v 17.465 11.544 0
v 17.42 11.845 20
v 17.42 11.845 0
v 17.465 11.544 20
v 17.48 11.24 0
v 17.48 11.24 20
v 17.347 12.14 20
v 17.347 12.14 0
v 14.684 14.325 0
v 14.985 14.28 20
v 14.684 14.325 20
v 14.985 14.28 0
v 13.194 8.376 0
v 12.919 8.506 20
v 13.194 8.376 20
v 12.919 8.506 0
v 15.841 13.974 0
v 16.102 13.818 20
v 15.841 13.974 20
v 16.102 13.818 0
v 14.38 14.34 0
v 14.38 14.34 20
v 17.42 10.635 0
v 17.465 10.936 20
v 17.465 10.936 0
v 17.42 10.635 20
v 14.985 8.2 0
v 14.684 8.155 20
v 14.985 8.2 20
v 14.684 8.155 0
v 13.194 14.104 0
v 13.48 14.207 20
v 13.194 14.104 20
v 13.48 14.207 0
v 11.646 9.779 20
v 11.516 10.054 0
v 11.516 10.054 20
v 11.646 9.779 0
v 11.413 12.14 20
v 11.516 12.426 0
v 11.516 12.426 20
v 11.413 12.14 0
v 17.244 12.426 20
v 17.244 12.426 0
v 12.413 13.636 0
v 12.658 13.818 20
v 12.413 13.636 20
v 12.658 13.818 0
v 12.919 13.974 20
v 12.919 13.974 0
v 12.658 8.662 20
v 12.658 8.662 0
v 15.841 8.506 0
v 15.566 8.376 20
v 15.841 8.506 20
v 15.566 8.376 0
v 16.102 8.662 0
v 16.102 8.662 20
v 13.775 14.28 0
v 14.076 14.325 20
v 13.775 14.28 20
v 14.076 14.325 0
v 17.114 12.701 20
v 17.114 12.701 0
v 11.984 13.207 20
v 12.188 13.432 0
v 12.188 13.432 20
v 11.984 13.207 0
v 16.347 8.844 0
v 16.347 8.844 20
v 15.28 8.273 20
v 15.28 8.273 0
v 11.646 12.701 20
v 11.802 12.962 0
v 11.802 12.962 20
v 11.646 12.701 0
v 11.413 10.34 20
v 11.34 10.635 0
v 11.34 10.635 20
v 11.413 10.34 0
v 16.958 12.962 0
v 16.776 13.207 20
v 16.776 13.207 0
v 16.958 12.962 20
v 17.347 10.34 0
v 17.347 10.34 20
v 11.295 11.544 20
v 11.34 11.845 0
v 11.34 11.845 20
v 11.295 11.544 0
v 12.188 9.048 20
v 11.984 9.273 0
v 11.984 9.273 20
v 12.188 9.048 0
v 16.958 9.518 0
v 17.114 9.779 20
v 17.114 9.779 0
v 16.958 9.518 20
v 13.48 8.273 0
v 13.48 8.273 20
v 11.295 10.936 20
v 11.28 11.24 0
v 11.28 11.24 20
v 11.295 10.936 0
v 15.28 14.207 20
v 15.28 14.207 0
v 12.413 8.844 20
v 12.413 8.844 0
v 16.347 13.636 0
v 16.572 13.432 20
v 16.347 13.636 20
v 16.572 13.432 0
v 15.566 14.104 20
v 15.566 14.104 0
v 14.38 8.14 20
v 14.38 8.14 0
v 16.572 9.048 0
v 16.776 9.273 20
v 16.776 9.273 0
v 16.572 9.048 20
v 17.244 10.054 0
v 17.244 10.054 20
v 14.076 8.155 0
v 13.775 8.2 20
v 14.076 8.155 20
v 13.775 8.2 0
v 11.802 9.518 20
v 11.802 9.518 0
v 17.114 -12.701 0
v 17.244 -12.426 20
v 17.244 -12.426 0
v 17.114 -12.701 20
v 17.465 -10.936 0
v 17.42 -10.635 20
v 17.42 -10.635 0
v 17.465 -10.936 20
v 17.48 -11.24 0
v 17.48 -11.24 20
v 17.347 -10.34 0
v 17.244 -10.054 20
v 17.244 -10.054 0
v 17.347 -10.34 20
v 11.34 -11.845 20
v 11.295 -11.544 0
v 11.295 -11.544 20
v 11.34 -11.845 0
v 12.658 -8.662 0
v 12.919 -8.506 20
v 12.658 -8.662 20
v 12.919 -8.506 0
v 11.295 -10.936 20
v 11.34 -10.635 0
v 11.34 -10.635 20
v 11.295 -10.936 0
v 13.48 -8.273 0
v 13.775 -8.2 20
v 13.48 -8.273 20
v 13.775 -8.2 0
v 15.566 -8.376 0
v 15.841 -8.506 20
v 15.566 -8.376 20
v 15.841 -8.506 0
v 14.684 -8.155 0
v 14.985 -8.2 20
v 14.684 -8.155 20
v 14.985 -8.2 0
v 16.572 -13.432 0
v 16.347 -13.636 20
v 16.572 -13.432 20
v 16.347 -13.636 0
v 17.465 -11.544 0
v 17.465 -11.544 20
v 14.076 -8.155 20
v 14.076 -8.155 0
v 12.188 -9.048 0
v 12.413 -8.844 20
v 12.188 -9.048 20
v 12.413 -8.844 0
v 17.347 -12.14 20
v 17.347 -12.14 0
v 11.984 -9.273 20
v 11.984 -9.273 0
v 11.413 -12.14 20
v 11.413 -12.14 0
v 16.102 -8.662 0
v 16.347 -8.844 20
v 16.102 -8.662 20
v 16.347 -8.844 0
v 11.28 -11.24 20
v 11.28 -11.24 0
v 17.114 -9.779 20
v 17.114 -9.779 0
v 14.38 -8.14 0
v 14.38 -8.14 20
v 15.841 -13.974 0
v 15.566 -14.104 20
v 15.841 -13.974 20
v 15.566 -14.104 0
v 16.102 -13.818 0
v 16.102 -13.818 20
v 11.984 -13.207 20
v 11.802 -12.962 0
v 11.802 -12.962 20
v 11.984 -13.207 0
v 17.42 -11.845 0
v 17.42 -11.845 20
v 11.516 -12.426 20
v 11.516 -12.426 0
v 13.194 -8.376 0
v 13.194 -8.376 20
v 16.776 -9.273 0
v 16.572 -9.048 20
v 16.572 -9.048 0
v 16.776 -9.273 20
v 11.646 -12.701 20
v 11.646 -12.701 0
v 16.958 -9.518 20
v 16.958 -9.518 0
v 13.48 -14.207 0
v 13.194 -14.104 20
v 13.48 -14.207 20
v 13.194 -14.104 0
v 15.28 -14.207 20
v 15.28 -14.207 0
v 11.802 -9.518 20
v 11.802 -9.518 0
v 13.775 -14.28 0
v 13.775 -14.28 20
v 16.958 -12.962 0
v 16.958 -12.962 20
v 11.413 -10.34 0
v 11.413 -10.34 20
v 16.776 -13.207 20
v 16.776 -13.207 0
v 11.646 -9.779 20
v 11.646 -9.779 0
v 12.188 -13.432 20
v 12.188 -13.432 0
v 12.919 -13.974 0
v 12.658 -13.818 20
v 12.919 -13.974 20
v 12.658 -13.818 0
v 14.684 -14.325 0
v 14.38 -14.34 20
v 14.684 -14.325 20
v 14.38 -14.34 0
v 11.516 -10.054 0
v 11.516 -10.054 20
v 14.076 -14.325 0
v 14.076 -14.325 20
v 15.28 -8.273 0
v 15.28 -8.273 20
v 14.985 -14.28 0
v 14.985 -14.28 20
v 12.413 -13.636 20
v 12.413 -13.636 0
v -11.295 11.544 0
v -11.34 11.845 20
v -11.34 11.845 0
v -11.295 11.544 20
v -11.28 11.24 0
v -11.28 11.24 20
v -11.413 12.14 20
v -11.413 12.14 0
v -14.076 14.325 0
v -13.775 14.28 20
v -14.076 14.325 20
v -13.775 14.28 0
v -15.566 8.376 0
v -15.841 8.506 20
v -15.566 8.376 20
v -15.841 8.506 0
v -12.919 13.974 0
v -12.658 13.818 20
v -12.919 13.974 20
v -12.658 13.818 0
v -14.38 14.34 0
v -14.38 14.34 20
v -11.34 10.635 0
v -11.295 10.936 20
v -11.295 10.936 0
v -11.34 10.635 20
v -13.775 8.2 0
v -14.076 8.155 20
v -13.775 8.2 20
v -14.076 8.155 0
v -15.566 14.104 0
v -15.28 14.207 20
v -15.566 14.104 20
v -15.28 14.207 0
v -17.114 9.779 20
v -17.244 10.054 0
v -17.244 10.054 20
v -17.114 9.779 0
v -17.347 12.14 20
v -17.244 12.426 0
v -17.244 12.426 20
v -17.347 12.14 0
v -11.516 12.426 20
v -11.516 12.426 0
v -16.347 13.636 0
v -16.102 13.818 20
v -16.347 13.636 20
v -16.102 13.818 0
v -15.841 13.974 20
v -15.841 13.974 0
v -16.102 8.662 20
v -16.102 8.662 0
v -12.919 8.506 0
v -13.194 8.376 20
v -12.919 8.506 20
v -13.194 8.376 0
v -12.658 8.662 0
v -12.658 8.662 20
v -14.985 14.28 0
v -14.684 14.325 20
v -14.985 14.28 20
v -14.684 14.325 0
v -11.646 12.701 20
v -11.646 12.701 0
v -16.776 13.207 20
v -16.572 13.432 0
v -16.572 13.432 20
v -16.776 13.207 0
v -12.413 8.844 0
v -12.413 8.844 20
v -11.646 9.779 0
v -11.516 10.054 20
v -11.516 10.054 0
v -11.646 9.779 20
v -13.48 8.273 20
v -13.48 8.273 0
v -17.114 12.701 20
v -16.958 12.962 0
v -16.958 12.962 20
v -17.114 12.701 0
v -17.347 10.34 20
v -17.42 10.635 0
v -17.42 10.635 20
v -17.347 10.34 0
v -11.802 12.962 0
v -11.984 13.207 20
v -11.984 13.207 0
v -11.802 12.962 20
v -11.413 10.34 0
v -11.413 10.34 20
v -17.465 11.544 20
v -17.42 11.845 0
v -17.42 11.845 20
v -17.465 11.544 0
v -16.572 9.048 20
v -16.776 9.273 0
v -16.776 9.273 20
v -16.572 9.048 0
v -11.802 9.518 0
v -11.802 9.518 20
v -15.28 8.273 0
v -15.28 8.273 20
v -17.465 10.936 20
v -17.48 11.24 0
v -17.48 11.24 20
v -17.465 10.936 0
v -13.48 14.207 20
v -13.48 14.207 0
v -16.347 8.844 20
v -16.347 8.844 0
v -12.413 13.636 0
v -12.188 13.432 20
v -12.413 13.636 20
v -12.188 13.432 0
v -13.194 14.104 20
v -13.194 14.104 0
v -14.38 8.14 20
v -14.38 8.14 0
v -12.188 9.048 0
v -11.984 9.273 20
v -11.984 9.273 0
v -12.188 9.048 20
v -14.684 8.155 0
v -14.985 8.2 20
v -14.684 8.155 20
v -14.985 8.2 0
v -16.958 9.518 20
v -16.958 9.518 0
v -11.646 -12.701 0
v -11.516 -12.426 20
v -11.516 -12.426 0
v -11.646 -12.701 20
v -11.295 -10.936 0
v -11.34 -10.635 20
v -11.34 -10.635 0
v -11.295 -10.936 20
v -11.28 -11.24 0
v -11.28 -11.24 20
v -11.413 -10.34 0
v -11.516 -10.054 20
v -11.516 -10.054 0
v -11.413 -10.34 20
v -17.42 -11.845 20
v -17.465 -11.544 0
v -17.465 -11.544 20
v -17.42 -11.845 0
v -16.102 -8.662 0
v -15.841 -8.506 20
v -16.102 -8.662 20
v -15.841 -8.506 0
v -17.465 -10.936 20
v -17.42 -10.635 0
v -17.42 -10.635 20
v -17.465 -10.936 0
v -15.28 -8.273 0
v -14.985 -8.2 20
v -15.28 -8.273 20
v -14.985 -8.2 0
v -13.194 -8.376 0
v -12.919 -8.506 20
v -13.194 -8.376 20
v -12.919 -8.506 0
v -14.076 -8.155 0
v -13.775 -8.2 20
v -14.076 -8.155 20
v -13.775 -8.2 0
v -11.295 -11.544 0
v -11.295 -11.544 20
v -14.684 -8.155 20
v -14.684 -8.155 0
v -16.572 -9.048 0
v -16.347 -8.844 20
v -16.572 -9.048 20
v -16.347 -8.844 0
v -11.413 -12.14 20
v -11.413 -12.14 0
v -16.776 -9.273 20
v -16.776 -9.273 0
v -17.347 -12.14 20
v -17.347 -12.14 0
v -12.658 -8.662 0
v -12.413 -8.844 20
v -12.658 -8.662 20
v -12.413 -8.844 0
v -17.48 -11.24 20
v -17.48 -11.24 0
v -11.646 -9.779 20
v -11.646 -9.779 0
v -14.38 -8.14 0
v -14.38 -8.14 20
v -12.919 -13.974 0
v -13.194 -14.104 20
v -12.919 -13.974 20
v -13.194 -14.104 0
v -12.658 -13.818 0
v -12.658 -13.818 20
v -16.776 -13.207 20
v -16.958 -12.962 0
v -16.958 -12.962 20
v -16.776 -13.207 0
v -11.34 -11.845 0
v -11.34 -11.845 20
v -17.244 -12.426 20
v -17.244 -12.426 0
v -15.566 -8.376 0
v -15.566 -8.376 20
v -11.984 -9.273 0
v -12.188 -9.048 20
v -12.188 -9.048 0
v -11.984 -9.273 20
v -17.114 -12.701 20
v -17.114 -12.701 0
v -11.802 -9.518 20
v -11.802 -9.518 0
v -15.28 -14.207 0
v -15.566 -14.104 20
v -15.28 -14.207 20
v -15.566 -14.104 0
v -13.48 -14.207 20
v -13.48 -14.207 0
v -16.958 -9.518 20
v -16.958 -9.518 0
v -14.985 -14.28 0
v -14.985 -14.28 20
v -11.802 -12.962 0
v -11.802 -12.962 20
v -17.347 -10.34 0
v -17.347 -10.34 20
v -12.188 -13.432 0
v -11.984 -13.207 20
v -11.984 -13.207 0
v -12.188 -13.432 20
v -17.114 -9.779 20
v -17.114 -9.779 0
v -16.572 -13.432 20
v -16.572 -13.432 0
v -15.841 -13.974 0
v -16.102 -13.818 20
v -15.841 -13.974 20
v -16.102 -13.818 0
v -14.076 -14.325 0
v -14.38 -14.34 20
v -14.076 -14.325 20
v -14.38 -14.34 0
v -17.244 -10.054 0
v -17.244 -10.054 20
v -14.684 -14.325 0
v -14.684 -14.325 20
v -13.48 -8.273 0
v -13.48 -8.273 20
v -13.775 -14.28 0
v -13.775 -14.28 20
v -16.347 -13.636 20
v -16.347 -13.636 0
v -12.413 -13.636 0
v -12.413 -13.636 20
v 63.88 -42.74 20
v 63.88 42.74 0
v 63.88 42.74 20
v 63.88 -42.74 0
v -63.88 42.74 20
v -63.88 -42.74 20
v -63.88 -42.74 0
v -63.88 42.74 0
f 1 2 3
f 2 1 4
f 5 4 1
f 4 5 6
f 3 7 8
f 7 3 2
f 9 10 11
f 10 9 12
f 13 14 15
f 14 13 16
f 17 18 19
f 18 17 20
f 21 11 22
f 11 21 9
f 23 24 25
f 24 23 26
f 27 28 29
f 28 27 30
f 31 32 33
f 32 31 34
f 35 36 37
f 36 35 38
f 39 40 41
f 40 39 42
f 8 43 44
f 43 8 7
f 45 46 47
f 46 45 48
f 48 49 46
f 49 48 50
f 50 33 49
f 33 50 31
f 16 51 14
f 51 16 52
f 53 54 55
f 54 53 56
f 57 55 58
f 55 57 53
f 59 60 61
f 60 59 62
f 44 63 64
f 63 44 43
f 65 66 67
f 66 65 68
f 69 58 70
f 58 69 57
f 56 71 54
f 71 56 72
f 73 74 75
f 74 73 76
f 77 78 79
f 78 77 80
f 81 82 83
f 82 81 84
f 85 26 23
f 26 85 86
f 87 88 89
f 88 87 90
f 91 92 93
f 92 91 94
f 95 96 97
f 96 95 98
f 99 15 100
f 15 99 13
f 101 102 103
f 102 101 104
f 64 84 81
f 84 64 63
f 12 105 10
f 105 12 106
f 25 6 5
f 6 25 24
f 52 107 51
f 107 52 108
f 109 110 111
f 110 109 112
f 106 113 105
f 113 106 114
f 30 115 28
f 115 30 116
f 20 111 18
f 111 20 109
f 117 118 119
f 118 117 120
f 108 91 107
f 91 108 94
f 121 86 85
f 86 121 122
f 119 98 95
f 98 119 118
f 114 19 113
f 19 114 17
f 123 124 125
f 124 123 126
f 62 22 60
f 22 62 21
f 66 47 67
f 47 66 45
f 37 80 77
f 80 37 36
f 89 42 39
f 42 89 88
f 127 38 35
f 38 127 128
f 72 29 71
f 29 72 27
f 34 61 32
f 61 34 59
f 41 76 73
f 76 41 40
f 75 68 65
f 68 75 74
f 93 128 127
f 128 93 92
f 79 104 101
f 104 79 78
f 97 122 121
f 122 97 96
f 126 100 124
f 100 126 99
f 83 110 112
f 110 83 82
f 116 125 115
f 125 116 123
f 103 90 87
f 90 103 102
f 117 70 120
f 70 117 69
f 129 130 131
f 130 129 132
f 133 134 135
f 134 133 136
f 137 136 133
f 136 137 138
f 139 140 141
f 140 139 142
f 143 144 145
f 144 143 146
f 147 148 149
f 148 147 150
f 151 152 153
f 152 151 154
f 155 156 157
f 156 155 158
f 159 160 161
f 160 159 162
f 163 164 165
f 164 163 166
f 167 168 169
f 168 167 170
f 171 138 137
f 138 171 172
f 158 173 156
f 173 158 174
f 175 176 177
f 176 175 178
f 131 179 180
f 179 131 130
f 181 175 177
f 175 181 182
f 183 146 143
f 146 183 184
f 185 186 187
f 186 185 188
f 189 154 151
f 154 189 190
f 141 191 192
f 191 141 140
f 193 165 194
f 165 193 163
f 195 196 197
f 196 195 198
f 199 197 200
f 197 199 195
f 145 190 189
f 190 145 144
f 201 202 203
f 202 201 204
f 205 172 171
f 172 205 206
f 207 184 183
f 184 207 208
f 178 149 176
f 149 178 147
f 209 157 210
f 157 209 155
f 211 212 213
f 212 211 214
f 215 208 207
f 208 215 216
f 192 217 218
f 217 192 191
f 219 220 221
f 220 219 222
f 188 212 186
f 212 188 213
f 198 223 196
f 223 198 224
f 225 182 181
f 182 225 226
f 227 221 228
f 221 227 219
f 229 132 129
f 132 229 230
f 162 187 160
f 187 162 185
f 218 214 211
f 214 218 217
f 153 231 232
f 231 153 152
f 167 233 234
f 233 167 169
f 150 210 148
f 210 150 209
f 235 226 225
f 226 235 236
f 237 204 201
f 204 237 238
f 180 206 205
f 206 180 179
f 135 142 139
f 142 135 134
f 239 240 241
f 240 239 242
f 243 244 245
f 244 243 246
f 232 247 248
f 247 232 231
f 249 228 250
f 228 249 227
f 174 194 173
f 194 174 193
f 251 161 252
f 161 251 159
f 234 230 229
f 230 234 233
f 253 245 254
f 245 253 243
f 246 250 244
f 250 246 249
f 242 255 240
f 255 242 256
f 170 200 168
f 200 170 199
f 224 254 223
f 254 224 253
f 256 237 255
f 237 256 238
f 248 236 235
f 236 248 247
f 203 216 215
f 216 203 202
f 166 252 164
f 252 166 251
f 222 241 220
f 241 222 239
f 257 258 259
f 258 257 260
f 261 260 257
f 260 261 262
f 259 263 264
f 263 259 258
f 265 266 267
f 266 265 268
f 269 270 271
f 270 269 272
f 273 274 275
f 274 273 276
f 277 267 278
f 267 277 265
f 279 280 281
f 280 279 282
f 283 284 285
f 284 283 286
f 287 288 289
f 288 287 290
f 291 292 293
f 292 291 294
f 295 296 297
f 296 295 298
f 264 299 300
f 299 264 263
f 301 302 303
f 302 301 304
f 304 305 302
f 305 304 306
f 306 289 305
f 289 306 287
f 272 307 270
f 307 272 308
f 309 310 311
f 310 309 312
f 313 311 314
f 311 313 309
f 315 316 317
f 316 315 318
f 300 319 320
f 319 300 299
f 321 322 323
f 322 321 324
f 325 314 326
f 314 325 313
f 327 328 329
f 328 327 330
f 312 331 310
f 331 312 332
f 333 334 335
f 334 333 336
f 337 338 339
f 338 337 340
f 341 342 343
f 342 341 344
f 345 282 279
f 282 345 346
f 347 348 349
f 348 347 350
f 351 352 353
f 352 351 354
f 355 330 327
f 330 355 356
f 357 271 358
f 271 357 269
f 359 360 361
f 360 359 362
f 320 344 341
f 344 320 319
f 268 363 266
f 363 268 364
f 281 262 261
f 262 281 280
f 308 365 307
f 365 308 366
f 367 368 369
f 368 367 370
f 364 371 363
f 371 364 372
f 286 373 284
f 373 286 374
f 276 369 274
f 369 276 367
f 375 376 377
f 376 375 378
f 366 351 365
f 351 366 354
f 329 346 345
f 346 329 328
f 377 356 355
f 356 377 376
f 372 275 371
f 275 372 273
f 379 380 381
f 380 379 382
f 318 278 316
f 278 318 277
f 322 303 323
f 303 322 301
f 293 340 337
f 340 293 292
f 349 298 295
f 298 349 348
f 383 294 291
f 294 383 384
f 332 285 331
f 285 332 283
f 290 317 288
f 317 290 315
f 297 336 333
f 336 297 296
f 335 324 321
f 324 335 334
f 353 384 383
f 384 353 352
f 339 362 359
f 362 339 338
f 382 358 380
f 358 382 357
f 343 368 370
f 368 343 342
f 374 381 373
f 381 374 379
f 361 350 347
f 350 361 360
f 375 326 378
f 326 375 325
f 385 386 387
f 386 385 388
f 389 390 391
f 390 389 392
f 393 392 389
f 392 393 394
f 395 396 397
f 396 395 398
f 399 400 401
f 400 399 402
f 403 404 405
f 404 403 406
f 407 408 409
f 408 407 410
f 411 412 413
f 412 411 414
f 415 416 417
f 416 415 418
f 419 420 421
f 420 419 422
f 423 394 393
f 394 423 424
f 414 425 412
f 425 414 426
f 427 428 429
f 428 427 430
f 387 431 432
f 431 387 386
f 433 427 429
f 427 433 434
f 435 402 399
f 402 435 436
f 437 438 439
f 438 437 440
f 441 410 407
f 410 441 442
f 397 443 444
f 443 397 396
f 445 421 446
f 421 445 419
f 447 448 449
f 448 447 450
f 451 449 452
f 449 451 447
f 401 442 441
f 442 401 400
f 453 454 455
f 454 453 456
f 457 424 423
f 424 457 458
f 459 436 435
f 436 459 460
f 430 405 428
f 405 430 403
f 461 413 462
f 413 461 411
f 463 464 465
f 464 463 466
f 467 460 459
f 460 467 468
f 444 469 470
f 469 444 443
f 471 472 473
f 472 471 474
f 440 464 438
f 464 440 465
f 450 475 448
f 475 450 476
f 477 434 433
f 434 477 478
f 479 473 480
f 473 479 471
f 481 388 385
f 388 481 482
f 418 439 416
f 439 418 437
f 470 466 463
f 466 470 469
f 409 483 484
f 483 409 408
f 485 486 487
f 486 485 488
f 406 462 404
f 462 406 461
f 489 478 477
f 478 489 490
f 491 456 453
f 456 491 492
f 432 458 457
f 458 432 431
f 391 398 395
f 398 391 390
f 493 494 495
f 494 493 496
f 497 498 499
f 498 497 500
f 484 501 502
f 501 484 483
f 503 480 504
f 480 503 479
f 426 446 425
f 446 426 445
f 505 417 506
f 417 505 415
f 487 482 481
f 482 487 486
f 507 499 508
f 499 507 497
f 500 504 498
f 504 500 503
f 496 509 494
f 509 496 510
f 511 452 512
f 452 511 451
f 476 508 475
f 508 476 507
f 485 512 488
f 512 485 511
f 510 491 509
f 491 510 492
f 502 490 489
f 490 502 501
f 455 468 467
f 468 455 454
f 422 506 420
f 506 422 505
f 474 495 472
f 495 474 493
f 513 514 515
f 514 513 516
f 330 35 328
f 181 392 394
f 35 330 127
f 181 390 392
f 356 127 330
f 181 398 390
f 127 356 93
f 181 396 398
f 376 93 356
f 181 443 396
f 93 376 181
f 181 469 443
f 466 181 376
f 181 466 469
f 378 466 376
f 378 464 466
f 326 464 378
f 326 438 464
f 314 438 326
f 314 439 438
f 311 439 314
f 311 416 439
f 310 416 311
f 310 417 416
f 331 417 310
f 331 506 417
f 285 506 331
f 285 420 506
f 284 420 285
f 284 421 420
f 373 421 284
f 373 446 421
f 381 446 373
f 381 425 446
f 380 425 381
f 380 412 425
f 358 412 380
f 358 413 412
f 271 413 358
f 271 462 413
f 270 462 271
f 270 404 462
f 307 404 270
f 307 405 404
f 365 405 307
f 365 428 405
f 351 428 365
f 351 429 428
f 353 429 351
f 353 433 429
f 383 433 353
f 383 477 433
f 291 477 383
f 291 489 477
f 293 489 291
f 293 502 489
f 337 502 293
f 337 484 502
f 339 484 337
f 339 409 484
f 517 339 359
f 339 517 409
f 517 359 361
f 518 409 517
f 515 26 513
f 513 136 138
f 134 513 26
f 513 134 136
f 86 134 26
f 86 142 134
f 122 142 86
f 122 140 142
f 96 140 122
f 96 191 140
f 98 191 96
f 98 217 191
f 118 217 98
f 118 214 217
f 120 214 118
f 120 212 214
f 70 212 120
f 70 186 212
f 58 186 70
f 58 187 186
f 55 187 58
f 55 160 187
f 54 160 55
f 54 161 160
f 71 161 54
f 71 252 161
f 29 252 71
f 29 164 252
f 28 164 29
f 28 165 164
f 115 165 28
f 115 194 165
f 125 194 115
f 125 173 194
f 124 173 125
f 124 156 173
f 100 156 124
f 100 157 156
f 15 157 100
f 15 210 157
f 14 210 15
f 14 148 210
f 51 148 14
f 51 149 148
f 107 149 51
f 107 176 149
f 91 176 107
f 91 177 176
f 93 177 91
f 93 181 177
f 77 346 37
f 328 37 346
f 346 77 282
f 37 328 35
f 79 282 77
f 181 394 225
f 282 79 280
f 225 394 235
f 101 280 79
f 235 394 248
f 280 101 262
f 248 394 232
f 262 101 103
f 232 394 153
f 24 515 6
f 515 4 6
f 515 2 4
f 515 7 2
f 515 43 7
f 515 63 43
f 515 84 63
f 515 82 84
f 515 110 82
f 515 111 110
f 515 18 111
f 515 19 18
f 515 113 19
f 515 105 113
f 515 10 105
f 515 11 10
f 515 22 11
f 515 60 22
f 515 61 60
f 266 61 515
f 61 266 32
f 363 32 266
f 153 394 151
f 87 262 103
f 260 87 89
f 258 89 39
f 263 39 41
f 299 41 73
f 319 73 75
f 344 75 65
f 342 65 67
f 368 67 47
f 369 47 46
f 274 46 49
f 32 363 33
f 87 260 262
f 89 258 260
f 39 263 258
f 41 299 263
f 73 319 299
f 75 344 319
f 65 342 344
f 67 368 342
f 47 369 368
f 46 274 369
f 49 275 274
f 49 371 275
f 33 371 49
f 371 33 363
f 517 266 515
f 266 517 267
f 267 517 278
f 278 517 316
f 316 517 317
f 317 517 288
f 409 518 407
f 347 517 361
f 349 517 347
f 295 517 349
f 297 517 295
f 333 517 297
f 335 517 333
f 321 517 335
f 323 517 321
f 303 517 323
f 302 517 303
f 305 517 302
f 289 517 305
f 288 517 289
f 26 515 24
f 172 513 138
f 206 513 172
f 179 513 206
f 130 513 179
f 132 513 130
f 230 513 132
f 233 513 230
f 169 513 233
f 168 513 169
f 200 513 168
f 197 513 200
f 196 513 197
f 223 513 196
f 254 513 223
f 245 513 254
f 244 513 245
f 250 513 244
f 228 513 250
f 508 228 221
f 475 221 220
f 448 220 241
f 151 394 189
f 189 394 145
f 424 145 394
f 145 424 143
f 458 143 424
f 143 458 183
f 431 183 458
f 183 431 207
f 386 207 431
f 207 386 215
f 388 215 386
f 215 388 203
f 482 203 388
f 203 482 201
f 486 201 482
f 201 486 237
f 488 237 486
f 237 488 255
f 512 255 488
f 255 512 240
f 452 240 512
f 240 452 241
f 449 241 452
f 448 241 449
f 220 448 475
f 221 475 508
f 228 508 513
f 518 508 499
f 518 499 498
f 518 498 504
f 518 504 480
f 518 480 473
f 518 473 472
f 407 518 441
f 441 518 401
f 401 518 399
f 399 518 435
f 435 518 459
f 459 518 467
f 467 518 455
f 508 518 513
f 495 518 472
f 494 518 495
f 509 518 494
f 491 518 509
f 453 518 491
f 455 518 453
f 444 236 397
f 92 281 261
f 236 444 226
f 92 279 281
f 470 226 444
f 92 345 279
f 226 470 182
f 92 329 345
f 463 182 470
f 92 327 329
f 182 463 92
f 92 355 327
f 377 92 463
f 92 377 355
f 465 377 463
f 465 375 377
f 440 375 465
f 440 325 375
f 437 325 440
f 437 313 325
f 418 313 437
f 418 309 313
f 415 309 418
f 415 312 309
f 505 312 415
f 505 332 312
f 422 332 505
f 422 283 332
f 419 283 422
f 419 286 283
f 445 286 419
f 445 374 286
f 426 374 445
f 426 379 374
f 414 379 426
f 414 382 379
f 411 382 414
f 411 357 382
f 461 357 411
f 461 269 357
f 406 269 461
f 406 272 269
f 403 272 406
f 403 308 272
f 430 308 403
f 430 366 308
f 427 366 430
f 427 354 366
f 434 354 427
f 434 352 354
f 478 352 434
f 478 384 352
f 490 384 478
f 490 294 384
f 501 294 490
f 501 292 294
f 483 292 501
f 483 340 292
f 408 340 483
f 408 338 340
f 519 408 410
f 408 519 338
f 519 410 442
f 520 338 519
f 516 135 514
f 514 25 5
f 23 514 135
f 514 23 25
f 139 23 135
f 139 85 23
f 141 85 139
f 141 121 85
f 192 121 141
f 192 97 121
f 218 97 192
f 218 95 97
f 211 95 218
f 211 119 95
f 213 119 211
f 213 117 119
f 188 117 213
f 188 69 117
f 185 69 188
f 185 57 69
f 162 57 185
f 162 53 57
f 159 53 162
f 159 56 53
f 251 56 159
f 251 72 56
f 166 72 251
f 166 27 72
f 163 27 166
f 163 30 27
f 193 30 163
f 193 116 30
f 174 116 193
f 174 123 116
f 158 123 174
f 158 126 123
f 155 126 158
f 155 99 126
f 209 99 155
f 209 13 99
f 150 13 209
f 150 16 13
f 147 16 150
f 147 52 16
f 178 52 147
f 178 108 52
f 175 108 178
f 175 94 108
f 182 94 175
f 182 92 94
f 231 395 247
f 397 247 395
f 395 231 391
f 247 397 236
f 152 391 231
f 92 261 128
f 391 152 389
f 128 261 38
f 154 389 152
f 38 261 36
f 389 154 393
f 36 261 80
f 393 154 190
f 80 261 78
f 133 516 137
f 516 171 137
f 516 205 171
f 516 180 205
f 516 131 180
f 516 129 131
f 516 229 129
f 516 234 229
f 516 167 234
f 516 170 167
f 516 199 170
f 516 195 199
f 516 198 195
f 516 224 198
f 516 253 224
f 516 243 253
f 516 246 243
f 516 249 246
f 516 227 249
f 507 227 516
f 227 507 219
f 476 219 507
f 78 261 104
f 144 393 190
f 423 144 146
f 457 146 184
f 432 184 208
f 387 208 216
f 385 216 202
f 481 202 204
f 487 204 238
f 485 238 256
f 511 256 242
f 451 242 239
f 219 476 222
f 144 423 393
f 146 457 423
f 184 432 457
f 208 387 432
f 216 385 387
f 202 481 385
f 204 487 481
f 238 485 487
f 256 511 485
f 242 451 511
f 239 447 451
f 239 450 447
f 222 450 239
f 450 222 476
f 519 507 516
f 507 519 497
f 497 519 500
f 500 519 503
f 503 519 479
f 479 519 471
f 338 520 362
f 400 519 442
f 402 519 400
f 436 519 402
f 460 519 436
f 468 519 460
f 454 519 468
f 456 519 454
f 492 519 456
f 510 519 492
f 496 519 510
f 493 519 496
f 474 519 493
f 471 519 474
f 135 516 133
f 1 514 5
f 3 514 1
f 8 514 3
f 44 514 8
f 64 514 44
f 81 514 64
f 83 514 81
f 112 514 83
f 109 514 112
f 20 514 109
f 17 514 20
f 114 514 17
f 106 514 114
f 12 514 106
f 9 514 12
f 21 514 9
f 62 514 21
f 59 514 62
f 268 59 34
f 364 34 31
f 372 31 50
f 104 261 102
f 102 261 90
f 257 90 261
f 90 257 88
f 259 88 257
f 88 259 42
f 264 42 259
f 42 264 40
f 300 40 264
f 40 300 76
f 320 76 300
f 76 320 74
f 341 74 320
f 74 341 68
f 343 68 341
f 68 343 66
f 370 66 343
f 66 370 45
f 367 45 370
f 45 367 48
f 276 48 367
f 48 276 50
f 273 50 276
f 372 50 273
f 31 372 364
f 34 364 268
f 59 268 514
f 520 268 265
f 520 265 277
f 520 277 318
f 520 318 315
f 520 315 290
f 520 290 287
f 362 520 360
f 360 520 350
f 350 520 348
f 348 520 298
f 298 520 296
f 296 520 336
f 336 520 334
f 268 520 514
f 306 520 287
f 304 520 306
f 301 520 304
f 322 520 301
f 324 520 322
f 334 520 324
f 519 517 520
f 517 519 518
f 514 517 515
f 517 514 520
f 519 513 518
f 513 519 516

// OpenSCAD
// Built by bench/smallmodels/features/compiler.py from a list of features.
$fn = 64;
difference() {
  union() {
    translate([0, 0, 0]) translate([-63.88, -42.74, 0]) cube([127.76, 85.48, 20]);
  }
  union() {
    translate([14.38, 11.24, -0.01]) rotate([0, 0, 0]) cylinder(d = 6.2, h = 20.02);
    translate([14.38, -11.24, -0.01]) rotate([0, 0, 0]) cylinder(d = 6.2, h = 20.02);
    translate([-14.38, 11.24, -0.01]) rotate([0, 0, 0]) cylinder(d = 6.2, h = 20.02);
    translate([-14.38, -11.24, -0.01]) rotate([0, 0, 0]) cylinder(d = 6.2, h = 20.02);
  }
}
